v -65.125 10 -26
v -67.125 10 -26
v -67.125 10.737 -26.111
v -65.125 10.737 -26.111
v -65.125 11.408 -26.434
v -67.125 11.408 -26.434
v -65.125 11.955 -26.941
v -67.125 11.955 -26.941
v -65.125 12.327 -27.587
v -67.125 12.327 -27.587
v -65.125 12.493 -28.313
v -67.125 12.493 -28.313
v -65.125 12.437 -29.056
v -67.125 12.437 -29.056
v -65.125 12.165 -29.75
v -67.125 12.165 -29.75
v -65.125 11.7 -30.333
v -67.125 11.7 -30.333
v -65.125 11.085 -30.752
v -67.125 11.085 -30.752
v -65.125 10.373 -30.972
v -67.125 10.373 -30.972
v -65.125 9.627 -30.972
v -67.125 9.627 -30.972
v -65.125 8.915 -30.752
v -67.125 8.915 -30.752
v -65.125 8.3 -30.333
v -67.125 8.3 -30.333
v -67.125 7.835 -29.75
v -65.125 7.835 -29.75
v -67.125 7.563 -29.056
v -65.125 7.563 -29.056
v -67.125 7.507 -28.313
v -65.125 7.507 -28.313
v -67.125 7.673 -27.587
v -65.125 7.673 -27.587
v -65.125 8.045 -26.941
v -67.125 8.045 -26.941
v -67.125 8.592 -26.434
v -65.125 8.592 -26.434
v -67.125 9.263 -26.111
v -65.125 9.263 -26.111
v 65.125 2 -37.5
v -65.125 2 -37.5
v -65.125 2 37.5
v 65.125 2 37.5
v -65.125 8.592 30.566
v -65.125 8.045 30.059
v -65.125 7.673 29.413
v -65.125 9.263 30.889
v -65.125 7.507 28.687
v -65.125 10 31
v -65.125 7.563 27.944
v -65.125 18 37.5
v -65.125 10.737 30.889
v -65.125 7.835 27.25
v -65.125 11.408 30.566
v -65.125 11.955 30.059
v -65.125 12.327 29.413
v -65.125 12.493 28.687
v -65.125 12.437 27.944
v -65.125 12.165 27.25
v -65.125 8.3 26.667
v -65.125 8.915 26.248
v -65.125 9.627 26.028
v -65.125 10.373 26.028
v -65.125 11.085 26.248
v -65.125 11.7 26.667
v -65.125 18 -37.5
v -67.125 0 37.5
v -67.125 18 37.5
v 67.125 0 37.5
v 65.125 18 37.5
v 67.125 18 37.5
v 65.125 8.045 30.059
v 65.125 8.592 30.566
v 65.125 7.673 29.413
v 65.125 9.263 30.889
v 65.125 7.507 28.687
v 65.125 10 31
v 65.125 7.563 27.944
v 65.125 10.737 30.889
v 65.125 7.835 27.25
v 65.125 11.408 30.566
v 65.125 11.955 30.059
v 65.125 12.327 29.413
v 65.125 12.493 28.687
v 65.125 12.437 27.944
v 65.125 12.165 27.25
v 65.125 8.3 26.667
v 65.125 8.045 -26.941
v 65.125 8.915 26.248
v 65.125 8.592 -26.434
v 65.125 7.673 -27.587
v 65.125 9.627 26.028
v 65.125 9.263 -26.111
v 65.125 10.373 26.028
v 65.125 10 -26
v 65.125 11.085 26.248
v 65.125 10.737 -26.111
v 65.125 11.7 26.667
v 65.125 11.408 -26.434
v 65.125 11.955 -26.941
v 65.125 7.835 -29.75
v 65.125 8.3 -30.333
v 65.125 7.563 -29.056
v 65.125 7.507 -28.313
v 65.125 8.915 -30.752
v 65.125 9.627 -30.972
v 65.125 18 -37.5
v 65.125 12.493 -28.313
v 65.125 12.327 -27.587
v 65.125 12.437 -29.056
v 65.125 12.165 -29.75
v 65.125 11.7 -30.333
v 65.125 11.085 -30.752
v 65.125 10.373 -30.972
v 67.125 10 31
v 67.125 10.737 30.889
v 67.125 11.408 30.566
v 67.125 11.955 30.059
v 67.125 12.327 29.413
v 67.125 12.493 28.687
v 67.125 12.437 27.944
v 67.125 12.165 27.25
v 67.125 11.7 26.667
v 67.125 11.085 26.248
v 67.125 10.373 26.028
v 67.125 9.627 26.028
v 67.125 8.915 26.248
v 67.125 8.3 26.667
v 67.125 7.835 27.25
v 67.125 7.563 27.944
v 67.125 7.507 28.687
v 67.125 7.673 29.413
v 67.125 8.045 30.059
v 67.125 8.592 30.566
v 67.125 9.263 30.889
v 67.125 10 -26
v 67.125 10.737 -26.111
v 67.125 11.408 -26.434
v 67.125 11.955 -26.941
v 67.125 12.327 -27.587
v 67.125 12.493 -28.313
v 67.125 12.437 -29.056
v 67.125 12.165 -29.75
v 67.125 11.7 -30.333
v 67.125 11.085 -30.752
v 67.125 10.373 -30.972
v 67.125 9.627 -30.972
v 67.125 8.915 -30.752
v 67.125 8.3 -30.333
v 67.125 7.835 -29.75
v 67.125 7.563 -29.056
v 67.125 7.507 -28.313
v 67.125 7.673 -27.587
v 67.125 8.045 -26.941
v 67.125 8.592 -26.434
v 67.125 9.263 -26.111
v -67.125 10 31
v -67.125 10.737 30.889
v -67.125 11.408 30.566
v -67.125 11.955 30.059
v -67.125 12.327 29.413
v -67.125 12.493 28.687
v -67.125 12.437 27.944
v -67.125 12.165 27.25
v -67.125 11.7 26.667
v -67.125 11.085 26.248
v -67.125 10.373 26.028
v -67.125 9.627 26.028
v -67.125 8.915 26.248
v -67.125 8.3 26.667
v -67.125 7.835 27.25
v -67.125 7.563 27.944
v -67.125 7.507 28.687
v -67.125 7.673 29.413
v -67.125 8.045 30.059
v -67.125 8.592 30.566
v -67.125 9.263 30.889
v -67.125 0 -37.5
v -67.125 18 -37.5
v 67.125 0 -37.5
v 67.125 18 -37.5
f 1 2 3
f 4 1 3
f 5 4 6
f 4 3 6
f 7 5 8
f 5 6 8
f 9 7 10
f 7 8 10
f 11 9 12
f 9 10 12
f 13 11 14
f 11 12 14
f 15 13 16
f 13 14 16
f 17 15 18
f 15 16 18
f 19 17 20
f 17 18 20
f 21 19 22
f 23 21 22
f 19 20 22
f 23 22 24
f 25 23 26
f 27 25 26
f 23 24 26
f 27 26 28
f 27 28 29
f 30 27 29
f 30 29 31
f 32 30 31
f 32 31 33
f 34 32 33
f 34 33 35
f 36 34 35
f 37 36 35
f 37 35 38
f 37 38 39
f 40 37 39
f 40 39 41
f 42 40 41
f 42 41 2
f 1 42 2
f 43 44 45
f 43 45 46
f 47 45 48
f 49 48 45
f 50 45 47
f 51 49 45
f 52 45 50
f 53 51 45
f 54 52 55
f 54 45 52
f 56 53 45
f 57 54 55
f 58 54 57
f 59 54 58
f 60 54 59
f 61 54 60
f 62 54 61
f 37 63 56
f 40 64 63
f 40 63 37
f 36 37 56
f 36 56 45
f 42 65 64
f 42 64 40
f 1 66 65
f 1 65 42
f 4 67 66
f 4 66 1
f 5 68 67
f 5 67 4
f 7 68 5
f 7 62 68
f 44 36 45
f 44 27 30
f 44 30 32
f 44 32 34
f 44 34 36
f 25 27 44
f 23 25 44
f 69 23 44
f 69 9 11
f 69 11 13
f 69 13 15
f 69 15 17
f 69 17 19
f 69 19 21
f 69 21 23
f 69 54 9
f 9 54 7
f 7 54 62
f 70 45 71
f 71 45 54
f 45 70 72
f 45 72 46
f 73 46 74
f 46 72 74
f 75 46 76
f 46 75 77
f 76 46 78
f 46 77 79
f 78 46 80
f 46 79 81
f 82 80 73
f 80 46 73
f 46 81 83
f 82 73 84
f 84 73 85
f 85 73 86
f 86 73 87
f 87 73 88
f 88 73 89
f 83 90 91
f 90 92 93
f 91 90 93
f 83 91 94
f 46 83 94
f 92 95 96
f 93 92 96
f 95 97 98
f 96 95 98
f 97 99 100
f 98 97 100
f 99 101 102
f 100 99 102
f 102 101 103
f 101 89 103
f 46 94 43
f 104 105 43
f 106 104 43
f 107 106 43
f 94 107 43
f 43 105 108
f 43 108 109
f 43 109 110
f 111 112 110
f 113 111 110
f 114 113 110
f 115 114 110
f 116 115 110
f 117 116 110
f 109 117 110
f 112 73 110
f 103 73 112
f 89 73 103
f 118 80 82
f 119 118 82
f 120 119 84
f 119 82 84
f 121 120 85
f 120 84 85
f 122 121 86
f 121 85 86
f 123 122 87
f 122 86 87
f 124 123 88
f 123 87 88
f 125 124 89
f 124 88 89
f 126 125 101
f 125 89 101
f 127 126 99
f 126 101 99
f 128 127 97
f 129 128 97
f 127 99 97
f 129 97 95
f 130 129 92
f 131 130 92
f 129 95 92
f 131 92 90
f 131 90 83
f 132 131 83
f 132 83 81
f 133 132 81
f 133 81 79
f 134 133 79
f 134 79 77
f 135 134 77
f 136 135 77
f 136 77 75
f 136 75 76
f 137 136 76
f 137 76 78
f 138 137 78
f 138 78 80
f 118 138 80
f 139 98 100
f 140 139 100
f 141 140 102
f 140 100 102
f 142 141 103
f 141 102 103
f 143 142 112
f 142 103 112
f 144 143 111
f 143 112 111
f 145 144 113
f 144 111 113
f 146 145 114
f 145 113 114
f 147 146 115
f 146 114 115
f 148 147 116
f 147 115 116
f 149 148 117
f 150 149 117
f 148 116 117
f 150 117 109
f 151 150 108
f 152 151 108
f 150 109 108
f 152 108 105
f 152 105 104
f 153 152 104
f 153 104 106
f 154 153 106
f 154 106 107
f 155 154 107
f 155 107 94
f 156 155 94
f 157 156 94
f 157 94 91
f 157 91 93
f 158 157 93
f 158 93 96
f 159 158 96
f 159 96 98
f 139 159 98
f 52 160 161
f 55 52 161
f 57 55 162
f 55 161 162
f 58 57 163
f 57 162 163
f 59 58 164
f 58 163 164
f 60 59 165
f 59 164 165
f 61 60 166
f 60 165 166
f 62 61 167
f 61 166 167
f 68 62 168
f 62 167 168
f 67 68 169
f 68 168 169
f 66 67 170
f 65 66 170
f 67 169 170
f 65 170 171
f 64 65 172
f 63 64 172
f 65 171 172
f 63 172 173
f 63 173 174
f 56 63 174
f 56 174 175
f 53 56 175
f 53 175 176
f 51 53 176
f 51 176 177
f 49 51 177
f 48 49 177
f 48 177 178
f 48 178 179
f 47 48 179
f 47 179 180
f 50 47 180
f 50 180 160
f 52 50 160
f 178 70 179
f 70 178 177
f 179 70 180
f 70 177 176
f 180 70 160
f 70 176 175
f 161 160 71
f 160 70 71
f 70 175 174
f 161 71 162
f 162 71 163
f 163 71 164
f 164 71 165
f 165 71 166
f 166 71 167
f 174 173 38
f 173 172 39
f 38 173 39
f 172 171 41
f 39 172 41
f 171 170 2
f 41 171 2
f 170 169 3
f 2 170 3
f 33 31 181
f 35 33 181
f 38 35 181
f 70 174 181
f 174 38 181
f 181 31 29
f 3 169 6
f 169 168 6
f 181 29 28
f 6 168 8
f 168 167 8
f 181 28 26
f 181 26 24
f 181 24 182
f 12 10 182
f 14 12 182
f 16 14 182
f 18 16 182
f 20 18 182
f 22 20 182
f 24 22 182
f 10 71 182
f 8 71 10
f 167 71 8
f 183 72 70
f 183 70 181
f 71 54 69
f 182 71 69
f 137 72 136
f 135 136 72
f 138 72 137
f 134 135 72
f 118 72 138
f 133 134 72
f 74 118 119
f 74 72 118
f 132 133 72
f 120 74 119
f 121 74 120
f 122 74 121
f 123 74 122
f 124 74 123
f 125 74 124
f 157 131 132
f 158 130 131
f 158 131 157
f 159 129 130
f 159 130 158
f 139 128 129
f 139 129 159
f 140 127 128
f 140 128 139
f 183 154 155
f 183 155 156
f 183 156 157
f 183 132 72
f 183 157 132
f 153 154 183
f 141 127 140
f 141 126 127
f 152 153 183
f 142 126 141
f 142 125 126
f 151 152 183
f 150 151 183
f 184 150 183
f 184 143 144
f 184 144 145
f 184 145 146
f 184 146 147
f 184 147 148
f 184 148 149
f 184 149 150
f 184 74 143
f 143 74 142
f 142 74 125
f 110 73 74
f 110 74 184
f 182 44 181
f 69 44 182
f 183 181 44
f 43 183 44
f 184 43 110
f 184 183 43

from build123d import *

# Parameters (mm, degrees)
ESBO_O1_W                = 130.25
ESBO_O1_H                = 75
RESSALTO_EXTRUS_O1_DEPTH = 2
ESBO_O2_W                = 75
ESBO_O2_H                = 18
RESSALTO_EXTRUS_O2_DEPTH = 2
ESBO_O3_R                = 2.5
CORTE_EXTRUS_O1_DEPTH    = 135.25


with BuildPart() as part:
    # Esboço1 → Ressalto-extrusão1 (new body)
    with BuildSketch(Plane(origin=(0, 0, 0), x_dir=(1, 0, 0), z_dir=(0, 1, 0))):
        Rectangle(ESBO_O1_W, ESBO_O1_H)
    extrude(amount=RESSALTO_EXTRUS_O1_DEPTH)

    # Esboço2 → Ressalto-extrusão2 (add)
    with BuildSketch(Plane(origin=(65.125, 0, 0), x_dir=(0, 0, -1), z_dir=(1, 0, 0))):
        with Locations((0, 9)):
            Rectangle(ESBO_O2_W, ESBO_O2_H)
    ressalto_extrus_o2 = extrude(amount=RESSALTO_EXTRUS_O2_DEPTH)

    # Espelhar1: Ressalto-extrusão2 across plane
    add(ressalto_extrus_o2.mirror(Plane(origin=(0, 0, 0), x_dir=(0, 0, 1), z_dir=(1, 0, 0))))

    # Esboço3 → Corte-extrusão1 (cut, through all)
    with BuildSketch(Plane.ZY.offset(67.125)):
        with Locations((-28.5, 10)):
            Circle(ESBO_O3_R)
        with Locations((28.5, 10)):
            Circle(ESBO_O3_R)
    extrude(amount=-CORTE_EXTRUS_O1_DEPTH, mode=Mode.SUBTRACT)


solid = part.part
